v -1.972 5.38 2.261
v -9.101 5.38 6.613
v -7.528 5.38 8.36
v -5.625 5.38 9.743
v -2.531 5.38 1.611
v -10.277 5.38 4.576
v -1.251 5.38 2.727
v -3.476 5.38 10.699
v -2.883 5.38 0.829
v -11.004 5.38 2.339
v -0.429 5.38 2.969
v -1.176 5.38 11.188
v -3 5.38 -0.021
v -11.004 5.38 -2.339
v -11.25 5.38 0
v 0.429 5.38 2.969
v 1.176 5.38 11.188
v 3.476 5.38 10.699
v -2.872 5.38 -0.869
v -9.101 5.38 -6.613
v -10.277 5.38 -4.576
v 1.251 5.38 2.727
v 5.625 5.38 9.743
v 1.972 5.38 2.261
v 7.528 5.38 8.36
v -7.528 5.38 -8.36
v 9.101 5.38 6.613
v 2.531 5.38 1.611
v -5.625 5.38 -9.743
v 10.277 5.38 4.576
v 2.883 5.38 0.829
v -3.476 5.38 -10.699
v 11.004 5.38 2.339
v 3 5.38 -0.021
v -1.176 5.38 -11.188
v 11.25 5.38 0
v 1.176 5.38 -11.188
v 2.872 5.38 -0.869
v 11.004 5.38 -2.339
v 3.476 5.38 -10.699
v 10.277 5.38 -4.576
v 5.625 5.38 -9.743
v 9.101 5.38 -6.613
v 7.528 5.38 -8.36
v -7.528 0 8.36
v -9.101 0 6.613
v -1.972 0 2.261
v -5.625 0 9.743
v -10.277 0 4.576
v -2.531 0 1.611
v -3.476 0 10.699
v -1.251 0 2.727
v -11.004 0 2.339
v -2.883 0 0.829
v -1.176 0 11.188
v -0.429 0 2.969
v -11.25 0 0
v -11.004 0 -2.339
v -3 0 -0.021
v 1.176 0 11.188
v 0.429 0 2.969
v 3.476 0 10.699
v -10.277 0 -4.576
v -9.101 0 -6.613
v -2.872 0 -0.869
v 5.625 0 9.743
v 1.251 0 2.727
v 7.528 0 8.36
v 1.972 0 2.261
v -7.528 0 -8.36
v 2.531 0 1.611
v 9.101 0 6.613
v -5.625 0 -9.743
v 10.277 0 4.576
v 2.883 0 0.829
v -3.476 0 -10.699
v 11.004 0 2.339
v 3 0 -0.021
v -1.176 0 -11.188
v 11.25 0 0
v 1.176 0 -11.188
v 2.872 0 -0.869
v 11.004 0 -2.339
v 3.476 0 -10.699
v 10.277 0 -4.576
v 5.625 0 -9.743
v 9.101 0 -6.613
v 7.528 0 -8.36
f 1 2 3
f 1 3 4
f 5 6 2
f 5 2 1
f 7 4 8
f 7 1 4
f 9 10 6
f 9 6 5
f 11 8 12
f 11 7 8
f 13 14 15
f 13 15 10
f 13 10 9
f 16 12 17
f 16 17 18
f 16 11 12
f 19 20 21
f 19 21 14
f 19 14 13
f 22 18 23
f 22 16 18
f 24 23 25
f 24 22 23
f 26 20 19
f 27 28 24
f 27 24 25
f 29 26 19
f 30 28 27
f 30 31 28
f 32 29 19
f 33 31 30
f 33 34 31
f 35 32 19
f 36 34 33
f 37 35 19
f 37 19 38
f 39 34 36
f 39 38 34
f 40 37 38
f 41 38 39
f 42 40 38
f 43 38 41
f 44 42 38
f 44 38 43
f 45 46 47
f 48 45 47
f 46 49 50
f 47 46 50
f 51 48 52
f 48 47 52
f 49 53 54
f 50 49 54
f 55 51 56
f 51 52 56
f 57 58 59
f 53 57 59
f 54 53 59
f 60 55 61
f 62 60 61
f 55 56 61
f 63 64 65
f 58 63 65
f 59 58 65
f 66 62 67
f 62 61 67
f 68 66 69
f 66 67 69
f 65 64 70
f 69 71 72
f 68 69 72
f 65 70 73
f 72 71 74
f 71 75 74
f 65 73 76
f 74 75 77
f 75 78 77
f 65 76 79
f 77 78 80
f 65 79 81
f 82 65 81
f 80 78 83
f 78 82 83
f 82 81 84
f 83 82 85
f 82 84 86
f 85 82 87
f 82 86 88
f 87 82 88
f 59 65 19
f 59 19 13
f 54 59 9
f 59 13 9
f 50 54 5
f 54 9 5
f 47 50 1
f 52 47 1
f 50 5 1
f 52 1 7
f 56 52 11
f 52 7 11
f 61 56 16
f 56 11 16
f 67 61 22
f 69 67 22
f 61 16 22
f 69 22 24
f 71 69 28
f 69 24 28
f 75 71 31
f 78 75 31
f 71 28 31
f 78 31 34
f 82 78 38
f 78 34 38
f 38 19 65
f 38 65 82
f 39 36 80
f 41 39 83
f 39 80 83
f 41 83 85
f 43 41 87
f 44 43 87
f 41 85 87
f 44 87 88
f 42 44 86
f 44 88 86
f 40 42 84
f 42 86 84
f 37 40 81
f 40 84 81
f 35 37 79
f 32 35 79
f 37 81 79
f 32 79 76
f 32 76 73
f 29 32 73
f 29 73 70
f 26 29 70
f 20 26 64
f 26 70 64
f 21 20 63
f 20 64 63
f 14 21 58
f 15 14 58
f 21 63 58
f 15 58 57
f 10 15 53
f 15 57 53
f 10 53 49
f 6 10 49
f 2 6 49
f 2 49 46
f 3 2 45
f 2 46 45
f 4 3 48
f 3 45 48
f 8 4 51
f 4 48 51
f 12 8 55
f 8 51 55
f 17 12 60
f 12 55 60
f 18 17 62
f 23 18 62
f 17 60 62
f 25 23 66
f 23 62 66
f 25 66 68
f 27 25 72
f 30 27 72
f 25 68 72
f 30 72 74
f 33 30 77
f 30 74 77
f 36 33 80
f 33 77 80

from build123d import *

# Parameters (mm, degrees)
SKETCH1_R           = 11.25
BOSS_EXTRUDE1_DEPTH = 5.38
SKETCH2_R           = 3
CUT_EXTRUDE1_DEPTH  = 5.38
SKETCH3_W           = 5.871522131
SKETCH3_H           = 2.131460622
BOSS_EXTRUDE2_DEPTH = 5.38


with BuildPart() as part:
    # Sketch1 → Boss-Extrude1 (new body)
    with BuildSketch(Plane(origin=(0, 0, 0), x_dir=(1, 0, 0), z_dir=(0, 1, 0))):
        Circle(SKETCH1_R)
    extrude(amount=BOSS_EXTRUDE1_DEPTH)

    # Sketch2 → Cut-Extrude1 (cut)
    with BuildSketch(Plane(origin=(0, 5.38, 0), x_dir=(1, 0, 0), z_dir=(0, 1, 0))):
        Circle(SKETCH2_R)
    extrude(amount=-CUT_EXTRUDE1_DEPTH, mode=Mode.SUBTRACT)

    # Sketch3 → Boss-Extrude2 (add)
    with BuildSketch(Plane(origin=(0, 5.38, 0), x_dir=(1, 0, 0), z_dir=(0, 1, 0))):
        with Locations((-0.064238934, 1.934269689)):
            Rectangle(SKETCH3_W, SKETCH3_H)
    extrude(amount=-BOSS_EXTRUDE2_DEPTH)


solid = part.part
